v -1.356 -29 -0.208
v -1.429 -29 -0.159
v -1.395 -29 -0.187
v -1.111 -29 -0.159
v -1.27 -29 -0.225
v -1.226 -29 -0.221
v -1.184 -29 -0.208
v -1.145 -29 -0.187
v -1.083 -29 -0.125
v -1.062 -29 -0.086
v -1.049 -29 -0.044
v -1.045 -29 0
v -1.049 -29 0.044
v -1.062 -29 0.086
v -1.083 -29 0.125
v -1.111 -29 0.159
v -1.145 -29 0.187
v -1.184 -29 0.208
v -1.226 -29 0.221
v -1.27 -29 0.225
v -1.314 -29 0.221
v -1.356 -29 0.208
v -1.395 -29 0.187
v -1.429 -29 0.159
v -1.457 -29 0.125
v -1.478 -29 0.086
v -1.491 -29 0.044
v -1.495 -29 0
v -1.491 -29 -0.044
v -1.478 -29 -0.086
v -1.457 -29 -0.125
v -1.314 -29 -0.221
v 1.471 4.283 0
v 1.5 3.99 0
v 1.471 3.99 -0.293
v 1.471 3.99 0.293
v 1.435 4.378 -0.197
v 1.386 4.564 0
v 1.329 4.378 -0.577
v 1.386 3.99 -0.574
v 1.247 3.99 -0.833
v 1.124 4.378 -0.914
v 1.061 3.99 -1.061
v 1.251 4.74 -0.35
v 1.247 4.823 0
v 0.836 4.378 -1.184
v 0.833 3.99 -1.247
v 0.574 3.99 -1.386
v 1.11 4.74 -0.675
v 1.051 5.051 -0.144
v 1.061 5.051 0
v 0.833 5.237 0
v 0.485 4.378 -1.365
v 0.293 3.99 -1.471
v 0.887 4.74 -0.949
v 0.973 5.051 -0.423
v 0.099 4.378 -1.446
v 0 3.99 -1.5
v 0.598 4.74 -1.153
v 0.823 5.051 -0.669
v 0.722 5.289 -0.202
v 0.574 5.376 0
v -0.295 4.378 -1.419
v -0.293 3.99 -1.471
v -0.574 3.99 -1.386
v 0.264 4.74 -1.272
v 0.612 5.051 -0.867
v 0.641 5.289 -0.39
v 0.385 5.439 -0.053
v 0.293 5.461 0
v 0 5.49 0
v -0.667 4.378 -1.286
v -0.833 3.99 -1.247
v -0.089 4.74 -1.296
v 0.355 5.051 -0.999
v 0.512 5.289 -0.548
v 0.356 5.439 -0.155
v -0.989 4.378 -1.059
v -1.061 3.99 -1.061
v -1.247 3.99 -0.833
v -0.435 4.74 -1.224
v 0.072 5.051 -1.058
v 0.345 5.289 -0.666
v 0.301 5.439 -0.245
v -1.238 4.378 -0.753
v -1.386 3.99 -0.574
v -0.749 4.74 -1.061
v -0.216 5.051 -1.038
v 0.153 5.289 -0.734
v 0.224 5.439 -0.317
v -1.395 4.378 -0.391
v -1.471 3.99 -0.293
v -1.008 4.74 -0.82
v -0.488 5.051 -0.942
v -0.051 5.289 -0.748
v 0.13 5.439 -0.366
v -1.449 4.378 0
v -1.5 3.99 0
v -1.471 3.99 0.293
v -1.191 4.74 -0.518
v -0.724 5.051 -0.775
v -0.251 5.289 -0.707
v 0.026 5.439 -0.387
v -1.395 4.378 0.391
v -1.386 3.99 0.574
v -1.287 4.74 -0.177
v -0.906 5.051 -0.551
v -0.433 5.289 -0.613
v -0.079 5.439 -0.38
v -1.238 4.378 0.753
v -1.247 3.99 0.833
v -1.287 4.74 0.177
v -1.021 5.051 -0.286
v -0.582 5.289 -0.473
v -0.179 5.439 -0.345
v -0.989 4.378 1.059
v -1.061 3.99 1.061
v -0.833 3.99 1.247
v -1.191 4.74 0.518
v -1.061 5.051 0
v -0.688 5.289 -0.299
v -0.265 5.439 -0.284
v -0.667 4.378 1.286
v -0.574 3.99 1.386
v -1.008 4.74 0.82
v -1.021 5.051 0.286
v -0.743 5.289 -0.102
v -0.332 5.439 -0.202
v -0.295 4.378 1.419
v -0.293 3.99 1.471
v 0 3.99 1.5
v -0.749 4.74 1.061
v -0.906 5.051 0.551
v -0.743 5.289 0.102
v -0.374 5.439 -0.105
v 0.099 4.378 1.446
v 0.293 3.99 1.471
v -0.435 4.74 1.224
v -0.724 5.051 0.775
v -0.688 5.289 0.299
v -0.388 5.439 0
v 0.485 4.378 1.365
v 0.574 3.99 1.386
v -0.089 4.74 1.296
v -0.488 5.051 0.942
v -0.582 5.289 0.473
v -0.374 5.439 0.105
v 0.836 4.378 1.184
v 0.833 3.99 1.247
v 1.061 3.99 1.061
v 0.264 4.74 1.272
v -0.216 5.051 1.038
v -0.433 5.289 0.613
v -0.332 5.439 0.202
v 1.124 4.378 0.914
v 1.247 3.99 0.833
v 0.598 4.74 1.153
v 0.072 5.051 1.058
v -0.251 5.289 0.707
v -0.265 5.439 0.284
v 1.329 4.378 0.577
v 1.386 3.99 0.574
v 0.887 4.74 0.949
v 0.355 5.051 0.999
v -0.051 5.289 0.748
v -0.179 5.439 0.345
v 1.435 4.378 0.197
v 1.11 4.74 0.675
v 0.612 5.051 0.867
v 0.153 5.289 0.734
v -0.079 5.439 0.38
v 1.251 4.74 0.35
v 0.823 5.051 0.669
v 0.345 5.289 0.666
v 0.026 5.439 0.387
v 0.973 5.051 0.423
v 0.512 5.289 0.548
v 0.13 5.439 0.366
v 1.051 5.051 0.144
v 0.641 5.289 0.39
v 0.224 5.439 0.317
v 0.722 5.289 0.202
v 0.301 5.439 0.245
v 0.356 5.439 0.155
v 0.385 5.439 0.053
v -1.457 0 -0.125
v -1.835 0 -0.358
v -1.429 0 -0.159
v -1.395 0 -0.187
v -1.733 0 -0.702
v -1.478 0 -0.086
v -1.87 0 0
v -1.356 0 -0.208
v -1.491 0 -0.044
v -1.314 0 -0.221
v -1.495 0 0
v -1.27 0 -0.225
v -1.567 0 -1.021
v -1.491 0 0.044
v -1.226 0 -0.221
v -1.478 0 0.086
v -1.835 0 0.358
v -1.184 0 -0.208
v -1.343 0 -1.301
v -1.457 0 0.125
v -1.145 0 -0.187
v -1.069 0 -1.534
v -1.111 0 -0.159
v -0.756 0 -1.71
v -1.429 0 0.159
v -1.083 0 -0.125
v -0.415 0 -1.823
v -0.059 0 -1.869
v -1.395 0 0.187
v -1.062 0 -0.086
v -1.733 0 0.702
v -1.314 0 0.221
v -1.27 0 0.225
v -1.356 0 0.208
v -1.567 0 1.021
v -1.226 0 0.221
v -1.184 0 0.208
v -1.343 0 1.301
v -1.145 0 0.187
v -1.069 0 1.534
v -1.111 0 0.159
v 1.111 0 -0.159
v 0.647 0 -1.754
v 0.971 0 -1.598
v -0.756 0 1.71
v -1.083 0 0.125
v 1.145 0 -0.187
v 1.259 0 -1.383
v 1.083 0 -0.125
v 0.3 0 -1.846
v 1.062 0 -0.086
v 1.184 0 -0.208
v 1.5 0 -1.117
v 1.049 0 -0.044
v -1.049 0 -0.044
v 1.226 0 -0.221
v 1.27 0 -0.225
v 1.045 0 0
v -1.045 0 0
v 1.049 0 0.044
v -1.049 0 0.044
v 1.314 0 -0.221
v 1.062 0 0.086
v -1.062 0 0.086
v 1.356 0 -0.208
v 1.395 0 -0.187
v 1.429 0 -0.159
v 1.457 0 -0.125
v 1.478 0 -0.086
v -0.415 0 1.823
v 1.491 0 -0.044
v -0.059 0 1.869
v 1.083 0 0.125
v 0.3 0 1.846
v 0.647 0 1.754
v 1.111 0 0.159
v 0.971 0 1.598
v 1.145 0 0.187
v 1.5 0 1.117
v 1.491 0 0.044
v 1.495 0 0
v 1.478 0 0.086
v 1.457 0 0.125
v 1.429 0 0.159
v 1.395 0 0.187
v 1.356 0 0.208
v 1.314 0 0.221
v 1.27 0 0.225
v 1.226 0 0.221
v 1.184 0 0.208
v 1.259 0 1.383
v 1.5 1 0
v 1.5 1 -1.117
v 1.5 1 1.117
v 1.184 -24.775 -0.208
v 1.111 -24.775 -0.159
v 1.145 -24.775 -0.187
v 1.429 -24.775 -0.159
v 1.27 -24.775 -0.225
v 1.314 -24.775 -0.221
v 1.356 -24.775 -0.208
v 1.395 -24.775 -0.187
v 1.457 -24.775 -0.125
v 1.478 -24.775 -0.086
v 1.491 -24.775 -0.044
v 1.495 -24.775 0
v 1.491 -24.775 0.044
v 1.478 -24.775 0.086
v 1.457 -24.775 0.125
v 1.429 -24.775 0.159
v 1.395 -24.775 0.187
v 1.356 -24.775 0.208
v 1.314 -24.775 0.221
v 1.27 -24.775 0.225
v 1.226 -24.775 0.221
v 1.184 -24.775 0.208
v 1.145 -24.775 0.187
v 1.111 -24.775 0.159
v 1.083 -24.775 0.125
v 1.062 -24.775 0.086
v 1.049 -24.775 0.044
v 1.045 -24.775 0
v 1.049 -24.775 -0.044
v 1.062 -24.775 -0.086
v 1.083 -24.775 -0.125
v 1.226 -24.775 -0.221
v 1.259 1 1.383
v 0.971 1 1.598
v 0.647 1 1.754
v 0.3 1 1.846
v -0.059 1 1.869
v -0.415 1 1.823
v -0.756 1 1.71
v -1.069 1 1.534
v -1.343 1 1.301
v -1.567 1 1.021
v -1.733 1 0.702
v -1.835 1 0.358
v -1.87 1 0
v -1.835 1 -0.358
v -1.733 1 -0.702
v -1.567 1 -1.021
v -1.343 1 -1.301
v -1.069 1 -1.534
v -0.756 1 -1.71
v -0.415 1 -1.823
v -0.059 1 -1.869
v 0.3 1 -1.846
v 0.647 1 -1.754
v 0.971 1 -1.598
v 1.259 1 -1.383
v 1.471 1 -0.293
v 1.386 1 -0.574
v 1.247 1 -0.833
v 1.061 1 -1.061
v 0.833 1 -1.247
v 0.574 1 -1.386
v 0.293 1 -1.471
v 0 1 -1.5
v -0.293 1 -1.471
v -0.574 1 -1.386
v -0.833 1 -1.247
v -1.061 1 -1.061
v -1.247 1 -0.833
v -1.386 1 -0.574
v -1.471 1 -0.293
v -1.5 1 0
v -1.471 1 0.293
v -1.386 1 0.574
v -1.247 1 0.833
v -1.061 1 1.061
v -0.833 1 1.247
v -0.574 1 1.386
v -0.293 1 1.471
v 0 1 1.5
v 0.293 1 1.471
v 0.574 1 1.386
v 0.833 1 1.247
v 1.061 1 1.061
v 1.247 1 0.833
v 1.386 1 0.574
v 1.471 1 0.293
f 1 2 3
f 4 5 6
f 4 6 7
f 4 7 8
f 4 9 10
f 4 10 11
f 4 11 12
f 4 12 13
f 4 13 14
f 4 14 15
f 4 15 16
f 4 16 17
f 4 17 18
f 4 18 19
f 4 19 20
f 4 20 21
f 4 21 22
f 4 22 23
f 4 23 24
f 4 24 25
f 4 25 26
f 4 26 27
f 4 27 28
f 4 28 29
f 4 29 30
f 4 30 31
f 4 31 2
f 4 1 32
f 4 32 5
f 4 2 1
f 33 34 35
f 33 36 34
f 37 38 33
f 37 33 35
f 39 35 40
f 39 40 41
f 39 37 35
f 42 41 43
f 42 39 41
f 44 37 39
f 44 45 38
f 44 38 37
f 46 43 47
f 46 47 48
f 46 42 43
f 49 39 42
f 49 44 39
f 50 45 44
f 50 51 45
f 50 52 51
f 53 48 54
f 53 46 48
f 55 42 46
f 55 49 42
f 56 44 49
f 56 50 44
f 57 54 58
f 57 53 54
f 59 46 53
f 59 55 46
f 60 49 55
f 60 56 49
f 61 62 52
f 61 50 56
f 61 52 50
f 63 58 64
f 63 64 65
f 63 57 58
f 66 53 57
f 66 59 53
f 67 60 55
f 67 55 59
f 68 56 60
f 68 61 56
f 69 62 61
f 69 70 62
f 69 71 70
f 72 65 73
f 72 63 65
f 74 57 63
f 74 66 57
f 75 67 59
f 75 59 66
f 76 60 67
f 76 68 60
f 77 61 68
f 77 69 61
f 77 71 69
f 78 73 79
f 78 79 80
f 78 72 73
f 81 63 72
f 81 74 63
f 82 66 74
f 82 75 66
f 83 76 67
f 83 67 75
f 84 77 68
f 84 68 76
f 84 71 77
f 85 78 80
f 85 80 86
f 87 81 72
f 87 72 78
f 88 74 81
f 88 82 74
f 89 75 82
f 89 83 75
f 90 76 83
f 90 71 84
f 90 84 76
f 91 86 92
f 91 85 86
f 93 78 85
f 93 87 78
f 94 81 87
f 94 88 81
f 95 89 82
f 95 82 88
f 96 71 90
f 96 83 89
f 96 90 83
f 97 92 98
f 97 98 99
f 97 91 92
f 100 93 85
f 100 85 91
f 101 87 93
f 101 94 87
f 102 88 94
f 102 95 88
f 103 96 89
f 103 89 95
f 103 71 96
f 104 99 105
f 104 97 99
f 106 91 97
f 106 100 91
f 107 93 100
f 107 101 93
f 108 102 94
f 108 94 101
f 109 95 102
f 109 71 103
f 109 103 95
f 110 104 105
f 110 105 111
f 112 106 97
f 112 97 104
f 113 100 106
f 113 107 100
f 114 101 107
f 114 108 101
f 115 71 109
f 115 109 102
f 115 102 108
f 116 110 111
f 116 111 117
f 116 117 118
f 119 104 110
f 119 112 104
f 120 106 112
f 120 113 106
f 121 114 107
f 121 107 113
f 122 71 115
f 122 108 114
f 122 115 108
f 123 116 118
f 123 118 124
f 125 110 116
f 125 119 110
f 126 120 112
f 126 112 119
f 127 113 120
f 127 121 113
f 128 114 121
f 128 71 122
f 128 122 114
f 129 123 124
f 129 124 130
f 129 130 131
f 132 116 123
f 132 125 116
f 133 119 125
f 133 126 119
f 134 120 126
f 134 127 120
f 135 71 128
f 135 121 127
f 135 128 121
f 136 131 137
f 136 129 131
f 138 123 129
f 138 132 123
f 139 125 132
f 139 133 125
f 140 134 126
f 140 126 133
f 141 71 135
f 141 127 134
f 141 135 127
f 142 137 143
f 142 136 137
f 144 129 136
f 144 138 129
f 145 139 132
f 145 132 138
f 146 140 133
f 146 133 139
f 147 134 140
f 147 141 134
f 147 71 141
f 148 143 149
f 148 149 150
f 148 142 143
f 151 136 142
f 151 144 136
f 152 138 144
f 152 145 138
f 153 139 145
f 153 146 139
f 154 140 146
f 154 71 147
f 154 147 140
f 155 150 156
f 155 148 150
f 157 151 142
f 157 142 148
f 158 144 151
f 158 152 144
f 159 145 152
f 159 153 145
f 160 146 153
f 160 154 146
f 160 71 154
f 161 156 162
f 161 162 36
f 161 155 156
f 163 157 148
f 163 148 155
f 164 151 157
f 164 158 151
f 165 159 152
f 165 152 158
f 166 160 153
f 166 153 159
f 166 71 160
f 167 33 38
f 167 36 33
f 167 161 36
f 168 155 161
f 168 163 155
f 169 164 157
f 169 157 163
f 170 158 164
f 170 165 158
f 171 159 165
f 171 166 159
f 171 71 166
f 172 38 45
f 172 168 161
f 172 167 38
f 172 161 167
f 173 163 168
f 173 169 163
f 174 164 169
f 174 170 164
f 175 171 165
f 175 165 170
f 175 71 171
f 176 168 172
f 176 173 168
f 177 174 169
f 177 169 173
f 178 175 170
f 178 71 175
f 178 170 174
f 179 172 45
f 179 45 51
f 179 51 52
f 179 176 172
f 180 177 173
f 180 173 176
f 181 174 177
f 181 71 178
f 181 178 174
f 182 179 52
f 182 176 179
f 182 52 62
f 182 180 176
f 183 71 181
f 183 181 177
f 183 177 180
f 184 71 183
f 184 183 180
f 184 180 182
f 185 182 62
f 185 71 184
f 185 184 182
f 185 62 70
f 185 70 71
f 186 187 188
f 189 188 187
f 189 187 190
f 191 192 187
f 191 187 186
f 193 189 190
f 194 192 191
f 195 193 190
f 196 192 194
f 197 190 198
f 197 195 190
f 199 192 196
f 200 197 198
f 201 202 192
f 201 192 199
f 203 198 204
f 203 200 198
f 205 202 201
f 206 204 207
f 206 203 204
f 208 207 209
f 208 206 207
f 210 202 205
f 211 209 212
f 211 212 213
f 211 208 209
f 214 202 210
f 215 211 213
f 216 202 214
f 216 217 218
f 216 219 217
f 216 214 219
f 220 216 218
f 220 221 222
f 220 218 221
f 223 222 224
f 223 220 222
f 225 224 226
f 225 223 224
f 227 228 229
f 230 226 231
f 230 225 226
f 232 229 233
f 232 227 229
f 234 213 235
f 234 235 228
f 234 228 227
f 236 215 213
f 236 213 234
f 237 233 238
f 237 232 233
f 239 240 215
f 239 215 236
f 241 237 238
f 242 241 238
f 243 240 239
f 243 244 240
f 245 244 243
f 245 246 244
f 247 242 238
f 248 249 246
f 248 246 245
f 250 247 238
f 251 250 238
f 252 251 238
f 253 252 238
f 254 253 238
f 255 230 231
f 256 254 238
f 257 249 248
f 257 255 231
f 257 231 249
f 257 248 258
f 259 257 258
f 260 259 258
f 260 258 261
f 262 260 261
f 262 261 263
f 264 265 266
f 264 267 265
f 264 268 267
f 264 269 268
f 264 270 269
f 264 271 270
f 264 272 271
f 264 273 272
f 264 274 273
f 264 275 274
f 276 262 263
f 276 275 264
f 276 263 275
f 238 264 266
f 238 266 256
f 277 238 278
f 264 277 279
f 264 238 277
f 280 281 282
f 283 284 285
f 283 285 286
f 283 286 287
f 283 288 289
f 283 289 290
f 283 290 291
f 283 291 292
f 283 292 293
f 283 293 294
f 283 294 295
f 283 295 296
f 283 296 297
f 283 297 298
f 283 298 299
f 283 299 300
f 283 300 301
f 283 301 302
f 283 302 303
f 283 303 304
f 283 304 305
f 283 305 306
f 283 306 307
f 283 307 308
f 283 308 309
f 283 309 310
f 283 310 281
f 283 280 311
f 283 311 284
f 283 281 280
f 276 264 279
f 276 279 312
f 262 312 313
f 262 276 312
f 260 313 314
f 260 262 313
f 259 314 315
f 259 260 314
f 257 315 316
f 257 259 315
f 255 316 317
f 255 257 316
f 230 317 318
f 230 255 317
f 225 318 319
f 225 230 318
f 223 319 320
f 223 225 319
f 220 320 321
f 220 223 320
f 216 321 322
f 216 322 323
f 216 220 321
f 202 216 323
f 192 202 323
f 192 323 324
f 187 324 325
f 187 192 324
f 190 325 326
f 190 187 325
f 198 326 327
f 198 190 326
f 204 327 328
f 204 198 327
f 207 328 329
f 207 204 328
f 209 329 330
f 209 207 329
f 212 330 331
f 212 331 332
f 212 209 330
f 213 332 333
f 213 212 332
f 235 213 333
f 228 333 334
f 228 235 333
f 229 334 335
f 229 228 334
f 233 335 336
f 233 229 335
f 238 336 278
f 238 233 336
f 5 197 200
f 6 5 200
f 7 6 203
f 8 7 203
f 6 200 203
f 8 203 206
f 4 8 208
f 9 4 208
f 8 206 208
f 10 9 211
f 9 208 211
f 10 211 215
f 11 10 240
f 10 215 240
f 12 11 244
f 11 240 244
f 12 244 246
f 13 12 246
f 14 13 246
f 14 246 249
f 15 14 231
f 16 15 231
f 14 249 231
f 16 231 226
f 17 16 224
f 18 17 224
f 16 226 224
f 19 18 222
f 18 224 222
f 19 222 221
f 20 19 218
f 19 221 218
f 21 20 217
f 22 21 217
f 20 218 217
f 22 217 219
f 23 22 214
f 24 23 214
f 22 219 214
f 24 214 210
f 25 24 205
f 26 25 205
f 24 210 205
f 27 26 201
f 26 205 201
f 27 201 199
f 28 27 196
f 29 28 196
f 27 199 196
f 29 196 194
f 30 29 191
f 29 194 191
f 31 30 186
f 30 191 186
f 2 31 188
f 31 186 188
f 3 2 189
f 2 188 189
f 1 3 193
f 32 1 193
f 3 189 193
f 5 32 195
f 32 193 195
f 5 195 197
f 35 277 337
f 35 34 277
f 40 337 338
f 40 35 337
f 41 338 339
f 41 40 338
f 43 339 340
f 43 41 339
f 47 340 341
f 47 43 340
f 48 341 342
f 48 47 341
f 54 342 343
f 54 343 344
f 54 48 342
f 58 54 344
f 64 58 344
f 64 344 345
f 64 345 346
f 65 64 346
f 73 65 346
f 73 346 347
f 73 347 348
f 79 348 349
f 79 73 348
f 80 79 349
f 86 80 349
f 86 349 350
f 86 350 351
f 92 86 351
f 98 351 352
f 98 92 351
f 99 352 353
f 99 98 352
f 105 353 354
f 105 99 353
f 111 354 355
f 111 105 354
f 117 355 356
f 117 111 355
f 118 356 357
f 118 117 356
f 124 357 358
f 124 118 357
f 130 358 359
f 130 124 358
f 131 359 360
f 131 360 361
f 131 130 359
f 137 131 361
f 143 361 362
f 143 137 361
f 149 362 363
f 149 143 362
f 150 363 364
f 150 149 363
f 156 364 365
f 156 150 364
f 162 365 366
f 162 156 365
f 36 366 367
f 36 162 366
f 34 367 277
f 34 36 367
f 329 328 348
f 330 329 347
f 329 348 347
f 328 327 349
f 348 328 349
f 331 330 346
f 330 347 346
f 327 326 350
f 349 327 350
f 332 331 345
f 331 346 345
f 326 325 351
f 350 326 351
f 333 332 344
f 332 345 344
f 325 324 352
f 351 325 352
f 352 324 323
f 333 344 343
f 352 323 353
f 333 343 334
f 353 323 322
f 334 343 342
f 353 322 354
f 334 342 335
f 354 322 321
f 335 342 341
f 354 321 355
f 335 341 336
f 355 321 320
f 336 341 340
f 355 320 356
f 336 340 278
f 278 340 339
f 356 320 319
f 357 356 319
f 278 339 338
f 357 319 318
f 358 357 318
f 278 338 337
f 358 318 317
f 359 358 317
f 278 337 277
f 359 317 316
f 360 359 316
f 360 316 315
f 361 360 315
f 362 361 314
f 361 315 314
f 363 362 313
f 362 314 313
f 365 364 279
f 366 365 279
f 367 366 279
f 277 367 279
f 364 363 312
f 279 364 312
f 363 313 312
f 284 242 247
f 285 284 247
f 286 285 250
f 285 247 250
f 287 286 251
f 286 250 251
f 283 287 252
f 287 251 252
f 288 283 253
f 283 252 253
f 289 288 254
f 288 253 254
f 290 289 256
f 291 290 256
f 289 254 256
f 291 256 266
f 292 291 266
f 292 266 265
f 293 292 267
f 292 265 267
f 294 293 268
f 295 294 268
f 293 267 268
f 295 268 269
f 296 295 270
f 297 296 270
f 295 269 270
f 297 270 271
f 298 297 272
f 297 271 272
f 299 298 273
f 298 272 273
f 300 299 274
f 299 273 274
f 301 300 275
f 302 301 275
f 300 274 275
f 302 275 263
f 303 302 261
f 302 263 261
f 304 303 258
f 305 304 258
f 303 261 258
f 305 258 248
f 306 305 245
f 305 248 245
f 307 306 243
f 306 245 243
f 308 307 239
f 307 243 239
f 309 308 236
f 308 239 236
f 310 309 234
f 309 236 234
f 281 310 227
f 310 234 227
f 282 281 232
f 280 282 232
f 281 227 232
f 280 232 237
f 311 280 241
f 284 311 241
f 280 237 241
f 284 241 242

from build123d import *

# Parameters (mm, degrees)
RESSALTO_EXTRUS_O1_DEPTH = 1
ESBO_O3_R                = 0.225
RESSALTO_EXTRUS_O3_DEPTH = 29
ESBO_O4_R                = 0.225
RESSALTO_EXTRUS_O4_DEPTH = 24.775


# Read off the part's stored shape, not the designer's step: Ressalto-extrusão2
with BuildPart() as part:
    # Esboço1 → Ressalto-extrusão1 (new body)
    with BuildSketch(Plane.XZ):
        with BuildLine():
            Line((1.5, -1.116646766), (1.5, 1.116646766))
            ThreePointArc((1.5, 1.116646766), (-1.87, 0), (1.5, -1.116646766))
        make_face()
    extrude(amount=-RESSALTO_EXTRUS_O1_DEPTH)

    # Ressalto-extrusão2 outline → Ressalto-extrusão2 (revolve)
    with BuildSketch(Plane.XY):
        with BuildLine():
            Line((1.5, 1), (1.5, 3.99))
            ThreePointArc((1.5, 3.99), (1.060660172, 5.050660172), (0, 5.49))
            Line((0, 5.49), (0, 1))
            Line((0, 1), (1.5, 1))
        make_face()
    revolve(axis=Axis((0, 0, 0), (0, 1, 0)))

    # Esboço3 → Ressalto-extrusão3 (add)
    with BuildSketch(Plane.XZ):
        with Locations(Location((-1.27, 0, 0), (0, 0, 270))):
            Circle(ESBO_O3_R)
    extrude(amount=RESSALTO_EXTRUS_O3_DEPTH)

    # Esboço4 → Ressalto-extrusão4 (add)
    with BuildSketch(Plane.XZ):
        with Locations(Location((1.27, 0, 0), (0, 0, 270))):
            Circle(ESBO_O4_R)
    extrude(amount=RESSALTO_EXTRUS_O4_DEPTH)


solid = part.part
